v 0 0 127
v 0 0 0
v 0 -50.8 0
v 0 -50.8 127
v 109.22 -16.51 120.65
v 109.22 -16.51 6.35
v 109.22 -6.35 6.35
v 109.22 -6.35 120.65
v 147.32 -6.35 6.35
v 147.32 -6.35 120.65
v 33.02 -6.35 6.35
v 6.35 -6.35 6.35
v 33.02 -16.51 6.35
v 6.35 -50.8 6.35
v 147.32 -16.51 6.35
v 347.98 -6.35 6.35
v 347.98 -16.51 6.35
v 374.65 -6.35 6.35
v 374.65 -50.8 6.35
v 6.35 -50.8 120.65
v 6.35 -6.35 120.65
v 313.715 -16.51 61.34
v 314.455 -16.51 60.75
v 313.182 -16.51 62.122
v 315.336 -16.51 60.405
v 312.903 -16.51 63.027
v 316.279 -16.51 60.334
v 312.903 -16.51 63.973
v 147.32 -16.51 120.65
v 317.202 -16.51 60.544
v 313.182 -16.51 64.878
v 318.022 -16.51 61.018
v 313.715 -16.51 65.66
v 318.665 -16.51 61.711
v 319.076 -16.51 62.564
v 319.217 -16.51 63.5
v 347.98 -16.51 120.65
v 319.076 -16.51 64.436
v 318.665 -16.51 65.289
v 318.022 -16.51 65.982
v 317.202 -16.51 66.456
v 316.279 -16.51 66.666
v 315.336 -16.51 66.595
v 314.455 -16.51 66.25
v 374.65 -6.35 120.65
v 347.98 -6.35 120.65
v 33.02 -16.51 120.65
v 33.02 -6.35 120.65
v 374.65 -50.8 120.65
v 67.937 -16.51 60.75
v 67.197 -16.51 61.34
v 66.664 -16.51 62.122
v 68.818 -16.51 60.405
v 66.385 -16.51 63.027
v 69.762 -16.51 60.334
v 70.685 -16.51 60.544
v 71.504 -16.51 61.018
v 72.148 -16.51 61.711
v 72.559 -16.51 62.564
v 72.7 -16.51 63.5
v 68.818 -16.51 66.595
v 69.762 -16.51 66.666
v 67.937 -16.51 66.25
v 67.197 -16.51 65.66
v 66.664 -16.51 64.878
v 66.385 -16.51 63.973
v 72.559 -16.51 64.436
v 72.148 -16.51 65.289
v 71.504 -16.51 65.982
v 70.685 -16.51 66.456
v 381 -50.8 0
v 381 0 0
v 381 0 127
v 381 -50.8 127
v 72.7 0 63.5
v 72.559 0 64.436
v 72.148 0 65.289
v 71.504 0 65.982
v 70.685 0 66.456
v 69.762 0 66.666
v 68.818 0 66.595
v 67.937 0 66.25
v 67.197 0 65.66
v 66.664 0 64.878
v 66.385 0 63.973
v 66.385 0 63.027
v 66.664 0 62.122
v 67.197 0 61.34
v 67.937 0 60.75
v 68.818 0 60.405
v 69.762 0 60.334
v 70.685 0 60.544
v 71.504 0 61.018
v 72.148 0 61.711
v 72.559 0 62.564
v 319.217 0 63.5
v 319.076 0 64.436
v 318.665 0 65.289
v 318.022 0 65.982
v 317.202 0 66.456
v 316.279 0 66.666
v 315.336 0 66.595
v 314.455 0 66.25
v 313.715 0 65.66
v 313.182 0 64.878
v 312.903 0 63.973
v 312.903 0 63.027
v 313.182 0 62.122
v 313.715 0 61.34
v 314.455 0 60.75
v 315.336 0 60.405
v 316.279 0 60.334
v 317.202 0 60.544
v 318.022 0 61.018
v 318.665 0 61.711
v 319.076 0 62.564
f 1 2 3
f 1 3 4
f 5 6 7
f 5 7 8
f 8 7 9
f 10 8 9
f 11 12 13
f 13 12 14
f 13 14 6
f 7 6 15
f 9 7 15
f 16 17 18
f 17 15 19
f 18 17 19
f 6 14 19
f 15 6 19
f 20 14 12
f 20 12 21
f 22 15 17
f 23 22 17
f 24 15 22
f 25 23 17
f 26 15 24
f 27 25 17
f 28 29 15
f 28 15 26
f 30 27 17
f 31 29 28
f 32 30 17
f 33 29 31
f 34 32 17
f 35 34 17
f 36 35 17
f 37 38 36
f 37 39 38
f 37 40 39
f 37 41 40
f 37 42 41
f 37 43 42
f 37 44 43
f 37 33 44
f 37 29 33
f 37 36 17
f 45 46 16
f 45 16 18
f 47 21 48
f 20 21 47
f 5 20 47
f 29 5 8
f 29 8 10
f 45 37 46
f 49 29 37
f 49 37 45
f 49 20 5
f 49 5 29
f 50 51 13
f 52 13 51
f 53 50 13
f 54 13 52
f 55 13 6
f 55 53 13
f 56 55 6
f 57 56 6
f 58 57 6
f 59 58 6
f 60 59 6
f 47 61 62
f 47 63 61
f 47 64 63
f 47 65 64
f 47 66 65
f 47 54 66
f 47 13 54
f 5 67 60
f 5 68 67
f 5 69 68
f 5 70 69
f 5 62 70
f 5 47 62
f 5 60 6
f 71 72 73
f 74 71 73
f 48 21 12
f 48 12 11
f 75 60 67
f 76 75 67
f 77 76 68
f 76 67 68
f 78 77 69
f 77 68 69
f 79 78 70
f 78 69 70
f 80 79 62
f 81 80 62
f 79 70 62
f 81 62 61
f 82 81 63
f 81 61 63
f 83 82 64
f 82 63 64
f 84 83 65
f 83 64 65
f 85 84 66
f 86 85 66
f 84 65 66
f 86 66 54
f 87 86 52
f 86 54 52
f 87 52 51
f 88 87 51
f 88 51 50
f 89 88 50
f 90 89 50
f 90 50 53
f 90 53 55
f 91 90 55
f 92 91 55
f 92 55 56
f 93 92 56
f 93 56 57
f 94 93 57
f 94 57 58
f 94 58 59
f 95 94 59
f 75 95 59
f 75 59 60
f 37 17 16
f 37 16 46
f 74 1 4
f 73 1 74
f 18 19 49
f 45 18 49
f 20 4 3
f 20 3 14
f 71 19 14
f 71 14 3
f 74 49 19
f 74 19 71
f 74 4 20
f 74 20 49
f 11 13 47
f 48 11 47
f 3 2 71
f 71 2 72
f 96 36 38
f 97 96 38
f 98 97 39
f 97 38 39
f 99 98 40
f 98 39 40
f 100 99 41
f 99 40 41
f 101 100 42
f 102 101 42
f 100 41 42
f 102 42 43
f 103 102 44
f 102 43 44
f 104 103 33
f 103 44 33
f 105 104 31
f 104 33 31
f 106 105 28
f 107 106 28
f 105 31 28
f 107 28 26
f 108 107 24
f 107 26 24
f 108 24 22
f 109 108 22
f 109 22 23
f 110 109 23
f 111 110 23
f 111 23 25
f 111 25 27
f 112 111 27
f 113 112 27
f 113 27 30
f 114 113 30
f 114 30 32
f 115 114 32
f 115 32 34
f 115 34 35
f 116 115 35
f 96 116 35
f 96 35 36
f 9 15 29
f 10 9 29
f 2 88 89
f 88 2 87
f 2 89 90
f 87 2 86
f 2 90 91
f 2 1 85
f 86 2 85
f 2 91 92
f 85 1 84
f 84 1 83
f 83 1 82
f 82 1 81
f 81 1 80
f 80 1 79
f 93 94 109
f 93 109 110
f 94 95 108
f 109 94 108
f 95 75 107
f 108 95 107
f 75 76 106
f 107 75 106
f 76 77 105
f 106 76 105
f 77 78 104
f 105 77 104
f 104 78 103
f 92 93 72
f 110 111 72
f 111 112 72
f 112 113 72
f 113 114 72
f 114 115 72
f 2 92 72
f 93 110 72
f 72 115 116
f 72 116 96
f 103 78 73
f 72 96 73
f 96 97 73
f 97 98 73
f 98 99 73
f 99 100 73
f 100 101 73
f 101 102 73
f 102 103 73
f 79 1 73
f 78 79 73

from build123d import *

# Parameters (mm, degrees)
F0_W     = 381
F0_H     = 127
F1_DEPTH = 50.8
F2_W     = 26.67
F2_H     = 114.3
F2_W_2   = 38.1
F3_DEPTH = 44.45
F4_W     = 76.2
F4_H     = 114.3
F4_W_2   = 200.66
F5_DEPTH = 34.29
F6_R     = 3.175
F7_DEPTH = 16.511


with BuildPart() as f1:
    # F0 (on Front) → F1 (new body)
    with BuildSketch(Plane.XZ):
        with Locations((190.5, 63.5)):
            Rectangle(F0_W, F0_H)
    extrude(amount=F1_DEPTH)

    # F2 (on face) → F3 (cut)
    with BuildSketch(Plane.XZ.offset(50.8)):
        with Locations((19.685, 63.5)):
            Rectangle(F2_W, F2_H)
        with Locations((128.27, 63.5)):
            Rectangle(F2_W_2, F2_H)
        with Locations((361.315, 63.5)):
            Rectangle(F2_W, F2_H)
    extrude(amount=-F3_DEPTH, mode=Mode.SUBTRACT)

    # F4 (on face) → F5 (cut)
    with BuildSketch(Plane.XZ.offset(50.8)):
        with Locations((71.12, 63.5)):
            Rectangle(F4_W, F4_H)
        with Locations((247.65, 63.5)):
            Rectangle(F4_W_2, F4_H)
    extrude(amount=-F5_DEPTH, mode=Mode.SUBTRACT)

    # F6 (on face) → F7 (cut, through all)
    with BuildSketch(Plane.XZ.offset(16.51)):
        with Locations((69.52478, 63.5)):
            Circle(F6_R)
        with Locations((316.042095, 63.5)):
            Circle(F6_R)
    extrude(amount=-F7_DEPTH, mode=Mode.SUBTRACT)


solid = f1.part
